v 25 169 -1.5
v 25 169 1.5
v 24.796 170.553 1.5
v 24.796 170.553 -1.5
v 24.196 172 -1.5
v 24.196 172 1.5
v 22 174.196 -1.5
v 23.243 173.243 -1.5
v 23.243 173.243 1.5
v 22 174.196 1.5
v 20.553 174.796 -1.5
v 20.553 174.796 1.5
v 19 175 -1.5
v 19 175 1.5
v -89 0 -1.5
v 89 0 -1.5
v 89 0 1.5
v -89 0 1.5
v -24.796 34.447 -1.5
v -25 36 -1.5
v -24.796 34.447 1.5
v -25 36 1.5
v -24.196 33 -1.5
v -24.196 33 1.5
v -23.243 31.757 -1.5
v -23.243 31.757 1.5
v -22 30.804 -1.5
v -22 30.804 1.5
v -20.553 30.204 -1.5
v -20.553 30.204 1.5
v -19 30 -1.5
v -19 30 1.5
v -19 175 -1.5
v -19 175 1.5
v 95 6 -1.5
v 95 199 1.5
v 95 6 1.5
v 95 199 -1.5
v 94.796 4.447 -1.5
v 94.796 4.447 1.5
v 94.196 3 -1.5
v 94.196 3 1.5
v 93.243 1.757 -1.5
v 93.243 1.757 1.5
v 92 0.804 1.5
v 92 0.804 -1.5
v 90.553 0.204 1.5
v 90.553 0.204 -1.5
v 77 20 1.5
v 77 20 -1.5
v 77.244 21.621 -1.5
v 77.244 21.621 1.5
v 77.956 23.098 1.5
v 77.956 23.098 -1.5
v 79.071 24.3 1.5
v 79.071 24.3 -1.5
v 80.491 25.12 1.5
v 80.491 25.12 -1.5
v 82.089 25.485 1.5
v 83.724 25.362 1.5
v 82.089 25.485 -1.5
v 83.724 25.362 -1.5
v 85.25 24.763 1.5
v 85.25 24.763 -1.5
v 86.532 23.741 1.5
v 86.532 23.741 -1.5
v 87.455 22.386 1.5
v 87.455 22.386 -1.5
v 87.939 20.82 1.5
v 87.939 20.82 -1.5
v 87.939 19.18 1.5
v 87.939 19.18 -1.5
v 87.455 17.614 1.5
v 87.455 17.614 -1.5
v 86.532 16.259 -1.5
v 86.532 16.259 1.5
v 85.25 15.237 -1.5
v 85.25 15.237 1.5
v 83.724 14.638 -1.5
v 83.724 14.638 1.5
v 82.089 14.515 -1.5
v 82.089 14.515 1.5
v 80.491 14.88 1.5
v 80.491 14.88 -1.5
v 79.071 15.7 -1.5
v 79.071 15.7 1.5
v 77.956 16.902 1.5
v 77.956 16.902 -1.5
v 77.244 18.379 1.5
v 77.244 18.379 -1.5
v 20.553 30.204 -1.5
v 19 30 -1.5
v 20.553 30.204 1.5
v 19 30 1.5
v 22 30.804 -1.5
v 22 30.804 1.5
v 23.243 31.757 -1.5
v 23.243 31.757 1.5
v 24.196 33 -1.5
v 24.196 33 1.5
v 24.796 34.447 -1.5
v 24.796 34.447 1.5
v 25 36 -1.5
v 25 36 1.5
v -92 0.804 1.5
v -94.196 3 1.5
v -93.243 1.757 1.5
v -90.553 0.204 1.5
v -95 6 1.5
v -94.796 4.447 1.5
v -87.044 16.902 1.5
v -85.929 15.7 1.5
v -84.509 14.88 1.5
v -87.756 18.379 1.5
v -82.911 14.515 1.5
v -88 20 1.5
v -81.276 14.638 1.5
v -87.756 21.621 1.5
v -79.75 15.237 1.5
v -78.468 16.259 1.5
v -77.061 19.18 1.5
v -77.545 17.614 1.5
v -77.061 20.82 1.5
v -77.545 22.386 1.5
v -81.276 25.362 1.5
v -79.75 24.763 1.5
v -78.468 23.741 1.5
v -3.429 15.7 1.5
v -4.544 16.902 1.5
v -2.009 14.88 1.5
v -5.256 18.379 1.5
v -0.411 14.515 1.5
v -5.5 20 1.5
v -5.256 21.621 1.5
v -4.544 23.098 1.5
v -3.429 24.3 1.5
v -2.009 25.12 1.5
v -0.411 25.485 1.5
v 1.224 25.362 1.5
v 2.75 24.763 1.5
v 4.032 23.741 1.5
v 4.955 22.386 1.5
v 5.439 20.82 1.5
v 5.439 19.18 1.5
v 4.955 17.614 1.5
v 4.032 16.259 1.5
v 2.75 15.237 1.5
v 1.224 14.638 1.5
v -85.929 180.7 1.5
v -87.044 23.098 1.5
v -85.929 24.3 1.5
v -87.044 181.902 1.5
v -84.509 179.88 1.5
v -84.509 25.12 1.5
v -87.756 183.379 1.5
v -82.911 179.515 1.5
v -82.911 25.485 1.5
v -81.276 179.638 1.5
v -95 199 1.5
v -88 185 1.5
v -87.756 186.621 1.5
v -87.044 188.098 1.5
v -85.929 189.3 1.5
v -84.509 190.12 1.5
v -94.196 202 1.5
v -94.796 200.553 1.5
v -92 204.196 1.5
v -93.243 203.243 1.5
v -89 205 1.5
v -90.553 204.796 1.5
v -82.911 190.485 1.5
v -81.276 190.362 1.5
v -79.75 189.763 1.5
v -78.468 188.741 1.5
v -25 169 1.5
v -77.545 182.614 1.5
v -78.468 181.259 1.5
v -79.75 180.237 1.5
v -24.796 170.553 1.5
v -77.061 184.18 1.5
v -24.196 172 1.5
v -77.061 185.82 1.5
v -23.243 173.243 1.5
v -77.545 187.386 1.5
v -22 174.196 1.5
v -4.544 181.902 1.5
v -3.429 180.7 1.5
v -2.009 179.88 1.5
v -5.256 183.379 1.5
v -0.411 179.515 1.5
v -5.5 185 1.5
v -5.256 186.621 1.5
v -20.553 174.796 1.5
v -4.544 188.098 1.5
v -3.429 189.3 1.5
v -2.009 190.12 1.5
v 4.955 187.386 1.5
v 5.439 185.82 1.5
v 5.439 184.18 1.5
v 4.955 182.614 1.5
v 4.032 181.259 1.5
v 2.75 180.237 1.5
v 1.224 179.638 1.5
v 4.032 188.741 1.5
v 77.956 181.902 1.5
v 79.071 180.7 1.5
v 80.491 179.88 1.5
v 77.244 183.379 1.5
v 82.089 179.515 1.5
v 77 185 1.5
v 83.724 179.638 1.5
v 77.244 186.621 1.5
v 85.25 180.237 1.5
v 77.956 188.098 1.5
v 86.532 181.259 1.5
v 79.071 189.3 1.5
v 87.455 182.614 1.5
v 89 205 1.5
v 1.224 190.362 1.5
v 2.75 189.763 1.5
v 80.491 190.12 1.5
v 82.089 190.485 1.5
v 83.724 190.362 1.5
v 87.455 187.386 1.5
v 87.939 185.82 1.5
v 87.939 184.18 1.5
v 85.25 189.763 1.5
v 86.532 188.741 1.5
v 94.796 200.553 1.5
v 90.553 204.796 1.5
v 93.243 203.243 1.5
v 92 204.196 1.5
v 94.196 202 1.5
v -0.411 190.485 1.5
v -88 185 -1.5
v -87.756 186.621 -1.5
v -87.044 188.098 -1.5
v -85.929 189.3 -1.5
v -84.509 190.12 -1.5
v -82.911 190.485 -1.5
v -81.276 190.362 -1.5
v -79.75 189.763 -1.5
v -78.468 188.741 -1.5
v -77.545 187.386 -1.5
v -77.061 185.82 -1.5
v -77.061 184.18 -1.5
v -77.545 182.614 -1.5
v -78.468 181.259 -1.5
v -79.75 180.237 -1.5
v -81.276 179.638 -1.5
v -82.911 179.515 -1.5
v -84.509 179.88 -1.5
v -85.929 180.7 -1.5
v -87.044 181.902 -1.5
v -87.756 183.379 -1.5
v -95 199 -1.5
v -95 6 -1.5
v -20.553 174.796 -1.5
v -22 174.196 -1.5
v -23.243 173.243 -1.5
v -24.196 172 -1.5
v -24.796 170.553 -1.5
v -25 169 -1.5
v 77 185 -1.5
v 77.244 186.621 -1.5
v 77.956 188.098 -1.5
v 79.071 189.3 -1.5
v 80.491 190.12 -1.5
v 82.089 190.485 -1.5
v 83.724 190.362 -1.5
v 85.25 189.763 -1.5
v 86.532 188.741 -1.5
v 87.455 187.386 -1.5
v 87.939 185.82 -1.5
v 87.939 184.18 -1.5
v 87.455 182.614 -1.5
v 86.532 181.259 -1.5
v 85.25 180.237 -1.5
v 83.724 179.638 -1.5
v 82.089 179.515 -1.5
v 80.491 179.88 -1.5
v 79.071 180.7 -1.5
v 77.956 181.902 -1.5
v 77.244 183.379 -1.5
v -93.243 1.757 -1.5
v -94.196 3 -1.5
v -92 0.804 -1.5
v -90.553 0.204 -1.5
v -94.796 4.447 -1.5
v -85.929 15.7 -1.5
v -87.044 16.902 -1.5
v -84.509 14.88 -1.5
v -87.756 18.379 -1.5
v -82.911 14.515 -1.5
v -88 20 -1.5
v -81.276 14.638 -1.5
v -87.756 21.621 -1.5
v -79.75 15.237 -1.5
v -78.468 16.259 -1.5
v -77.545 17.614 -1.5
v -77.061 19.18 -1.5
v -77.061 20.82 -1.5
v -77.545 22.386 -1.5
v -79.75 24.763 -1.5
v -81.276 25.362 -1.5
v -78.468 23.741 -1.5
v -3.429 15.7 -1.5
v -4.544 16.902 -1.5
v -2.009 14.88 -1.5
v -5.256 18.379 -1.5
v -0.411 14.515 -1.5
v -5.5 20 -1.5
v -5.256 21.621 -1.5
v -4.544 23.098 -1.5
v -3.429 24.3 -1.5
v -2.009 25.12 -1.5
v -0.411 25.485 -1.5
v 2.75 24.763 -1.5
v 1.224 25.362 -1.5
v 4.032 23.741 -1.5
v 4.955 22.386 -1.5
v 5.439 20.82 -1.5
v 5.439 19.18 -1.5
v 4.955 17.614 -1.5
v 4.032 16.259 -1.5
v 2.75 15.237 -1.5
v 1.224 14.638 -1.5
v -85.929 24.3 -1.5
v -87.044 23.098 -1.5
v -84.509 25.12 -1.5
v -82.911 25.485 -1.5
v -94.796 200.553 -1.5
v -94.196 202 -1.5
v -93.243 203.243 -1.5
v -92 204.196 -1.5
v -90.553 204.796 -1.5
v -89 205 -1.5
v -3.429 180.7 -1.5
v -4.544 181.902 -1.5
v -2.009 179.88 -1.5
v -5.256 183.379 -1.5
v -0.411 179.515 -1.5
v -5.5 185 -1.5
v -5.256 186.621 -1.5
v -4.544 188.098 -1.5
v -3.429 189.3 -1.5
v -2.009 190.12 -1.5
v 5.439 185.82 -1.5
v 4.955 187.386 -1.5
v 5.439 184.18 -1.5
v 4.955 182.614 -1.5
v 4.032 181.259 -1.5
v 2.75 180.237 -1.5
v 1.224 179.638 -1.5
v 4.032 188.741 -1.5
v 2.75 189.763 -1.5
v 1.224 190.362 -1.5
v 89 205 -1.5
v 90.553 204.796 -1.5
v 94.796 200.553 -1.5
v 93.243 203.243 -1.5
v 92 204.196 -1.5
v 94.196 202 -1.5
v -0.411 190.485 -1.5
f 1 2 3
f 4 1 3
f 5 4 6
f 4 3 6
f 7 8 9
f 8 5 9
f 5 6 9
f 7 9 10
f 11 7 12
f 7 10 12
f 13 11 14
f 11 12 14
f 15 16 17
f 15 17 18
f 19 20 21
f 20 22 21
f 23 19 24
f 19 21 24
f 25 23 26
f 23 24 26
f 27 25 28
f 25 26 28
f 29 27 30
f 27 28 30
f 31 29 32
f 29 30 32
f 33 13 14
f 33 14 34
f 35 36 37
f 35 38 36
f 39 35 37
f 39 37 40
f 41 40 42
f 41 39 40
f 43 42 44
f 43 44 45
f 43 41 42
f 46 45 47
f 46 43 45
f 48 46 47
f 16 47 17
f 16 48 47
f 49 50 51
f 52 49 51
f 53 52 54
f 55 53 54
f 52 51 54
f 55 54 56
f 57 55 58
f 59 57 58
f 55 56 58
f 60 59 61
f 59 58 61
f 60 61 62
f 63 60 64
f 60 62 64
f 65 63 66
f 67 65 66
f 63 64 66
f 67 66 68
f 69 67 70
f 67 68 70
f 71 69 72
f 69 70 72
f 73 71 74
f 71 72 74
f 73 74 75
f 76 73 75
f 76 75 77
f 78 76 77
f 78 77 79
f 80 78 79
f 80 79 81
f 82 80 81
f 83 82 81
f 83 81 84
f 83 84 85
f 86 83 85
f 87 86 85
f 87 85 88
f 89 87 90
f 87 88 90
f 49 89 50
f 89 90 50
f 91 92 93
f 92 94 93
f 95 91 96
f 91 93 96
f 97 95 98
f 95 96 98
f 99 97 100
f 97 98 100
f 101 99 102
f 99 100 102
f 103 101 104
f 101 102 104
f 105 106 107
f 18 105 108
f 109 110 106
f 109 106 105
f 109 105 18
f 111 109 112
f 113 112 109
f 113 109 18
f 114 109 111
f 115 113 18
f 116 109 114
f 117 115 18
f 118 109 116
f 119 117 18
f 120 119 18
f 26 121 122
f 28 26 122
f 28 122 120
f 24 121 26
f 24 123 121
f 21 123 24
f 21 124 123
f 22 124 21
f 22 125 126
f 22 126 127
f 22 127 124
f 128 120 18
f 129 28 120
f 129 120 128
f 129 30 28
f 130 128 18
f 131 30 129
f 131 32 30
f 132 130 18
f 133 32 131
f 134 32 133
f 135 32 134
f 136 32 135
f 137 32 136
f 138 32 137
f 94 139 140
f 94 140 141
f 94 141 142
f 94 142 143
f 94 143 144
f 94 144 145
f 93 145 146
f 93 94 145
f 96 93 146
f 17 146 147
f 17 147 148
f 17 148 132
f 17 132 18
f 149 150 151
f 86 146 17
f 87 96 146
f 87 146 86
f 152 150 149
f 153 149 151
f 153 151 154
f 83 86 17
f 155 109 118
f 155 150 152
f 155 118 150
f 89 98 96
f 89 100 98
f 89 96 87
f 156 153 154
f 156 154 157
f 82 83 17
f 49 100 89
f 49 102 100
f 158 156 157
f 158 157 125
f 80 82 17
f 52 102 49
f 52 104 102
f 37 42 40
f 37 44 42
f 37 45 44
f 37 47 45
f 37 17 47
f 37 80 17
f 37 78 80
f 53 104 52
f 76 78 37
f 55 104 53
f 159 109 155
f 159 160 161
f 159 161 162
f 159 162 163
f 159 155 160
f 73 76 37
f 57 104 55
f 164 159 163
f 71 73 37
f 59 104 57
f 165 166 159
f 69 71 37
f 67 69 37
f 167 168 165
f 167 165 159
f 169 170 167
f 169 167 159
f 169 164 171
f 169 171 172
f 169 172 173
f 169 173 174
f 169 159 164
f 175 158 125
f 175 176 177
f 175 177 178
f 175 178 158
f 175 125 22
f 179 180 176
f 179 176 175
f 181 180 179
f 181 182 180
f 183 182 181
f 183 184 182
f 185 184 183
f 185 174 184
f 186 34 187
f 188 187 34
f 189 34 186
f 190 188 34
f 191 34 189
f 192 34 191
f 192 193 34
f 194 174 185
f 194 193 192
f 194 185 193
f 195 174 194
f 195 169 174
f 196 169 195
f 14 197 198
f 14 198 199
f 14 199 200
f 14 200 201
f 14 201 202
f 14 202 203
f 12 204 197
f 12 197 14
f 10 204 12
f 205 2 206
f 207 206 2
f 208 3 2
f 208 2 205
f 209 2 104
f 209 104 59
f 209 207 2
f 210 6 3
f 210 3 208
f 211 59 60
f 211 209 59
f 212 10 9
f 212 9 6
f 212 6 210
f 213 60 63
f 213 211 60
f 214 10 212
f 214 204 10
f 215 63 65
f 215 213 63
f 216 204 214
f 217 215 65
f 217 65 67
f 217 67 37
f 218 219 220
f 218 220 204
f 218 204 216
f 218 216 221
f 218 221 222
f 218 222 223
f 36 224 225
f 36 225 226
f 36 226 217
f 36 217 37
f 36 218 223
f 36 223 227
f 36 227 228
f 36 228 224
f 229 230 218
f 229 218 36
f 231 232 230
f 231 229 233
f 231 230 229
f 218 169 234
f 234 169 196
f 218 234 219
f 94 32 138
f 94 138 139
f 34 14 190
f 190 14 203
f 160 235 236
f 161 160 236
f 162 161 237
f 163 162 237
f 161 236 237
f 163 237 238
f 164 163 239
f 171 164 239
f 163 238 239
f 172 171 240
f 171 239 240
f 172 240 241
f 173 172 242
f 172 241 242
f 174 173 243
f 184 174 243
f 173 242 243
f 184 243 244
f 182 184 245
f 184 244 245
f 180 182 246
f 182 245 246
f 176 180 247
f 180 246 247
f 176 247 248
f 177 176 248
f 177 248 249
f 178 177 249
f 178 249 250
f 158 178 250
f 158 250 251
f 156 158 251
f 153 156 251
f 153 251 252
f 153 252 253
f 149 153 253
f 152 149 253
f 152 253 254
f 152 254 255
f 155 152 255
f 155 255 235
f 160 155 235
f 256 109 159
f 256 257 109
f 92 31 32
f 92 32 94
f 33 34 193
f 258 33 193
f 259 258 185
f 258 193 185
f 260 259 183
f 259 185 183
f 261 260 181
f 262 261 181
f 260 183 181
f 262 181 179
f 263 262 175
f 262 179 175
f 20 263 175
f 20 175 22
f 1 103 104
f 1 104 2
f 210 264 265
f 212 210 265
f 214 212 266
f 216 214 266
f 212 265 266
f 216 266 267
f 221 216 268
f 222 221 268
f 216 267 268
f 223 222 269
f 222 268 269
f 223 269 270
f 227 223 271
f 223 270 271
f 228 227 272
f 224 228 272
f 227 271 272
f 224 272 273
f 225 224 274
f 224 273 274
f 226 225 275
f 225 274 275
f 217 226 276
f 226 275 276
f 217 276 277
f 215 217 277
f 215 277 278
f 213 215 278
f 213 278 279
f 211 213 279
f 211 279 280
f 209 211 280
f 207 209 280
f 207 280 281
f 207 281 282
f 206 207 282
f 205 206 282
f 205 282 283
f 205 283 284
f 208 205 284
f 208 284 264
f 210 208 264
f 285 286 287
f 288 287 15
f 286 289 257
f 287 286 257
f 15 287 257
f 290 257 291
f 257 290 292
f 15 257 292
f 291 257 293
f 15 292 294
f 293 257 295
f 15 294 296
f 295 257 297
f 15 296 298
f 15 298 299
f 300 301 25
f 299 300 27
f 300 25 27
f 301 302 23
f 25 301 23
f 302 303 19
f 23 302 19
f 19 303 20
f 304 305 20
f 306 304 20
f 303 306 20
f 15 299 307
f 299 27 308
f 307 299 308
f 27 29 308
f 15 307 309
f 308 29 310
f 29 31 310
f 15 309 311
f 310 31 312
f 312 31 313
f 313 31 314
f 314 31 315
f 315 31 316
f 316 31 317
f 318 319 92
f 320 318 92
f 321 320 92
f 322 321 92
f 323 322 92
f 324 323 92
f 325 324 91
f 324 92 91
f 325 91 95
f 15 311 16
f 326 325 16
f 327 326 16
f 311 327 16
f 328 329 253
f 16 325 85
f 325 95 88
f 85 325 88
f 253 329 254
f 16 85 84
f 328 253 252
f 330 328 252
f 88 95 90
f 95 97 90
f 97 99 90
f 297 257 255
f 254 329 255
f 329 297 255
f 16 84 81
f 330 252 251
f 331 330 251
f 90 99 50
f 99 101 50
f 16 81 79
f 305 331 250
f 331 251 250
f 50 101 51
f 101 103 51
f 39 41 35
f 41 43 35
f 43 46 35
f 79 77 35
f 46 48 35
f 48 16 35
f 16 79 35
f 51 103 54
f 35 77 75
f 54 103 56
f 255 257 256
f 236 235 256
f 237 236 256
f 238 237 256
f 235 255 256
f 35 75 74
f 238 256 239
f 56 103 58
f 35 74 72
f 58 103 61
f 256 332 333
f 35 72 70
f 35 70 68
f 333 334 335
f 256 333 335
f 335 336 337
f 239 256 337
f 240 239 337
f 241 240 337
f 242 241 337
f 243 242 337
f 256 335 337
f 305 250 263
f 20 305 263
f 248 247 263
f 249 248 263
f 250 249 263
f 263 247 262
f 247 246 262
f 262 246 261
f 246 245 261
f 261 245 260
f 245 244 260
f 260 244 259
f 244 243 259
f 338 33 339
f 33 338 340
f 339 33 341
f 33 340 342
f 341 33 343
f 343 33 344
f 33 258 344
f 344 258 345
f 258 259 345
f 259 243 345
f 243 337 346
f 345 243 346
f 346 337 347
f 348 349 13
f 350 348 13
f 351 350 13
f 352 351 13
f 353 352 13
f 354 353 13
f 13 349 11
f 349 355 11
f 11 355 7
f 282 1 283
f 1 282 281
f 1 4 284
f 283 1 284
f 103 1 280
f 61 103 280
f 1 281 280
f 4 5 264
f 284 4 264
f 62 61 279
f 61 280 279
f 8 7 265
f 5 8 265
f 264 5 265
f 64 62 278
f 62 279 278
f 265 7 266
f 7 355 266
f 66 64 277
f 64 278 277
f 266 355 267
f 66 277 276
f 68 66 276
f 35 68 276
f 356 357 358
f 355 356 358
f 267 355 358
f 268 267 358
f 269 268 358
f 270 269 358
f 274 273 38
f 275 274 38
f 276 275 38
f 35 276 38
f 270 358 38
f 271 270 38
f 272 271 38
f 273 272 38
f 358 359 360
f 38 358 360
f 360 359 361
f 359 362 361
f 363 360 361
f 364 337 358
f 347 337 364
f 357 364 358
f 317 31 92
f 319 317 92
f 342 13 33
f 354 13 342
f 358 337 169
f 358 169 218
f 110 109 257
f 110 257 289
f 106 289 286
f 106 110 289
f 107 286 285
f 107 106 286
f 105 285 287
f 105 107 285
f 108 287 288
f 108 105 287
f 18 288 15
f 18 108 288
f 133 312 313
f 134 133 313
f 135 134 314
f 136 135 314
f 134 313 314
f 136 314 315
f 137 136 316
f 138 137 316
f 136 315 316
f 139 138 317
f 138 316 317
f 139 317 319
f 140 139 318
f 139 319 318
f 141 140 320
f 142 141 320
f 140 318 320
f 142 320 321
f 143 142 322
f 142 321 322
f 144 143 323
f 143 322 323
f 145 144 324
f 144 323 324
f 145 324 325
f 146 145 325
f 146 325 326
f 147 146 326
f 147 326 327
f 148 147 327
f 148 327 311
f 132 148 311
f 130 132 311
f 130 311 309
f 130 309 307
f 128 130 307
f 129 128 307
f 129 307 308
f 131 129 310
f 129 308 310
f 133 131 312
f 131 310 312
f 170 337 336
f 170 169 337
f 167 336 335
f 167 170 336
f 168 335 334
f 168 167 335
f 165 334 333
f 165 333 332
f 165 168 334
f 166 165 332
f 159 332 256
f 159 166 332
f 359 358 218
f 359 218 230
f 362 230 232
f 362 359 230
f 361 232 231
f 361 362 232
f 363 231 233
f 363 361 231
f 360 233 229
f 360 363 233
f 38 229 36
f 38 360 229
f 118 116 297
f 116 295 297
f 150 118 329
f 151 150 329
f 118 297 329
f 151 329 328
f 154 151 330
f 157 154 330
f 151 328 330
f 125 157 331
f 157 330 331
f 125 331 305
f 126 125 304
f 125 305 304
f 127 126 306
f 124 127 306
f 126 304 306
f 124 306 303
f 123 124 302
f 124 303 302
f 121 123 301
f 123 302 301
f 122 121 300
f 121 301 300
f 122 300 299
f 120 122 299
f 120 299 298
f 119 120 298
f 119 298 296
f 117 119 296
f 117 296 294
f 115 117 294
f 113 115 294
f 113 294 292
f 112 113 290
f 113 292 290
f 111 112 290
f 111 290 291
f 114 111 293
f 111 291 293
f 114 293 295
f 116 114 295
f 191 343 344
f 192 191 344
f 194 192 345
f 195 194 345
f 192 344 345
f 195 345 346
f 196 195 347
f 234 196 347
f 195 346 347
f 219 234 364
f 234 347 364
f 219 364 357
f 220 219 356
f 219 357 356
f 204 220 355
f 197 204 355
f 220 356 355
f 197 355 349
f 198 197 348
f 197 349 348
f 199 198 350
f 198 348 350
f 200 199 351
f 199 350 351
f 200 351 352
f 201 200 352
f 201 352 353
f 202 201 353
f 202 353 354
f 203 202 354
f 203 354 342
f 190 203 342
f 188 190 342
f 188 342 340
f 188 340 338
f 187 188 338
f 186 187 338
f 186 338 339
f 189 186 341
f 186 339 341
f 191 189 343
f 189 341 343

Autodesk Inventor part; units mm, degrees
ref_plane "YZ Plane" through (0, 0, 0) normal (1, 0, 0) x (0, 1, 0)
ref_plane "XZ Plane" through (0, 0, 0) normal (0, 1, 0) x (-1, 0, 0)
ref_plane "XY Plane" through (0, 0, 0) normal (0, 0, 1) x (1, 0, 0)
sketch "Sketch1" plane through (0, 0, 0) normal (0, 0, 1) x (1, 0, 0)
  line L0 (-95, 205) -> (95, 205)
  line L1 (95, 205) -> (95, 0)
  line L2 (95, 0) -> (-95, 0)
  line L3 (-95, 0) -> (-95, 205)
  point P0 (0, 0)
  point P1 (0, 0)
  point P2 (0, 0)
  point P3 (0, 0)
  point P4 (0, 0)
  dimension "d27" = 190
  dimension "d29" = 205
extrude "Plate1" add sketch "Sketch1" along normal mid plane 3
sketch "Sketch4" plane through (0, 0, -1.5) normal (0, 0, -1) x (-1, 0, 0)
  line L0 (95, 205) -> (-95, 205) construction
  line L1 (-95, 205) -> (-95, 0) construction
  line L2 (-95, 0) -> (95, 0) construction
  line L3 (95, 0) -> (95, 205) construction
  line L4 (-25, 175) -> (25, 175)
  line L5 (25, 175) -> (25, 30)
  line L6 (25, 30) -> (-25, 30)
  line L7 (-25, 30) -> (-25, 175)
  line L8 (-25, 175) -> (25, 30) construction
  line L9 (25, 175) -> (-25, 30) construction
  circle A0 centre (0, 185) radius 5.5
  circle A1 centre (0, 20) radius 5.5
  circle A2 centre (82.5, 20) radius 5.5
  circle A3 centre (82.5, 185) radius 5.5
  circle A4 centre (-82.5, 185) radius 5.5
  circle A5 centre (-82.5, 20) radius 5.5
  line L10 (0, 175) -> (0, 30) construction
  line L11 (-25, 102.5) -> (25, 102.5) construction
  point P0 (0, 0)
  point P1 (0, 102.5)
  point P2 (95, 102.5)
  point P3 (0, 205)
  point P4 (0, 102.5)
  dimension "d51" = 50
  dimension "d52" = 145
  dimension "d53" = 11
  dimension "d54" = 165
  dimension "d70" = 165
  dimension "d71" = 165
extrude "Cut1" cut sketch "Sketch4" against normal blind 3
fillet "Corner Round1" radius 6 8 edges at (95, 205, 0) (95, 0, 0) (-95, 0, 0) (-95, 205, 0) (25, 30, 0) (-25, 30, 0) (25, 175, 0) (-25, 175, 0)
equation "\"d71\" = d70"
equation "\"d57\" = Thickness"
equation "\"d15\" = Thickness"
equation "\"BendRadius\" = Thickness"
equation "\"BendReliefWidth\" = Thickness"
equation "\"BendReliefDepth\" = 0.5 * Thickness"
equation "\"CornerReliefSize\" = 4 * Thickness"
equation "\"MinimumRemnant\" = 2 * Thickness"
equation "\"TransitionRadius\" = BendRadius"
equation "\"JacobiRadiusSize\" = BendRadius"
equation "\"GapSize\" = Thickness"
equation "\"d68\" = 145"
equation "\"Thickness\" = 3"
properties part number "DMF 2.1 01 42 Gear way 2"
